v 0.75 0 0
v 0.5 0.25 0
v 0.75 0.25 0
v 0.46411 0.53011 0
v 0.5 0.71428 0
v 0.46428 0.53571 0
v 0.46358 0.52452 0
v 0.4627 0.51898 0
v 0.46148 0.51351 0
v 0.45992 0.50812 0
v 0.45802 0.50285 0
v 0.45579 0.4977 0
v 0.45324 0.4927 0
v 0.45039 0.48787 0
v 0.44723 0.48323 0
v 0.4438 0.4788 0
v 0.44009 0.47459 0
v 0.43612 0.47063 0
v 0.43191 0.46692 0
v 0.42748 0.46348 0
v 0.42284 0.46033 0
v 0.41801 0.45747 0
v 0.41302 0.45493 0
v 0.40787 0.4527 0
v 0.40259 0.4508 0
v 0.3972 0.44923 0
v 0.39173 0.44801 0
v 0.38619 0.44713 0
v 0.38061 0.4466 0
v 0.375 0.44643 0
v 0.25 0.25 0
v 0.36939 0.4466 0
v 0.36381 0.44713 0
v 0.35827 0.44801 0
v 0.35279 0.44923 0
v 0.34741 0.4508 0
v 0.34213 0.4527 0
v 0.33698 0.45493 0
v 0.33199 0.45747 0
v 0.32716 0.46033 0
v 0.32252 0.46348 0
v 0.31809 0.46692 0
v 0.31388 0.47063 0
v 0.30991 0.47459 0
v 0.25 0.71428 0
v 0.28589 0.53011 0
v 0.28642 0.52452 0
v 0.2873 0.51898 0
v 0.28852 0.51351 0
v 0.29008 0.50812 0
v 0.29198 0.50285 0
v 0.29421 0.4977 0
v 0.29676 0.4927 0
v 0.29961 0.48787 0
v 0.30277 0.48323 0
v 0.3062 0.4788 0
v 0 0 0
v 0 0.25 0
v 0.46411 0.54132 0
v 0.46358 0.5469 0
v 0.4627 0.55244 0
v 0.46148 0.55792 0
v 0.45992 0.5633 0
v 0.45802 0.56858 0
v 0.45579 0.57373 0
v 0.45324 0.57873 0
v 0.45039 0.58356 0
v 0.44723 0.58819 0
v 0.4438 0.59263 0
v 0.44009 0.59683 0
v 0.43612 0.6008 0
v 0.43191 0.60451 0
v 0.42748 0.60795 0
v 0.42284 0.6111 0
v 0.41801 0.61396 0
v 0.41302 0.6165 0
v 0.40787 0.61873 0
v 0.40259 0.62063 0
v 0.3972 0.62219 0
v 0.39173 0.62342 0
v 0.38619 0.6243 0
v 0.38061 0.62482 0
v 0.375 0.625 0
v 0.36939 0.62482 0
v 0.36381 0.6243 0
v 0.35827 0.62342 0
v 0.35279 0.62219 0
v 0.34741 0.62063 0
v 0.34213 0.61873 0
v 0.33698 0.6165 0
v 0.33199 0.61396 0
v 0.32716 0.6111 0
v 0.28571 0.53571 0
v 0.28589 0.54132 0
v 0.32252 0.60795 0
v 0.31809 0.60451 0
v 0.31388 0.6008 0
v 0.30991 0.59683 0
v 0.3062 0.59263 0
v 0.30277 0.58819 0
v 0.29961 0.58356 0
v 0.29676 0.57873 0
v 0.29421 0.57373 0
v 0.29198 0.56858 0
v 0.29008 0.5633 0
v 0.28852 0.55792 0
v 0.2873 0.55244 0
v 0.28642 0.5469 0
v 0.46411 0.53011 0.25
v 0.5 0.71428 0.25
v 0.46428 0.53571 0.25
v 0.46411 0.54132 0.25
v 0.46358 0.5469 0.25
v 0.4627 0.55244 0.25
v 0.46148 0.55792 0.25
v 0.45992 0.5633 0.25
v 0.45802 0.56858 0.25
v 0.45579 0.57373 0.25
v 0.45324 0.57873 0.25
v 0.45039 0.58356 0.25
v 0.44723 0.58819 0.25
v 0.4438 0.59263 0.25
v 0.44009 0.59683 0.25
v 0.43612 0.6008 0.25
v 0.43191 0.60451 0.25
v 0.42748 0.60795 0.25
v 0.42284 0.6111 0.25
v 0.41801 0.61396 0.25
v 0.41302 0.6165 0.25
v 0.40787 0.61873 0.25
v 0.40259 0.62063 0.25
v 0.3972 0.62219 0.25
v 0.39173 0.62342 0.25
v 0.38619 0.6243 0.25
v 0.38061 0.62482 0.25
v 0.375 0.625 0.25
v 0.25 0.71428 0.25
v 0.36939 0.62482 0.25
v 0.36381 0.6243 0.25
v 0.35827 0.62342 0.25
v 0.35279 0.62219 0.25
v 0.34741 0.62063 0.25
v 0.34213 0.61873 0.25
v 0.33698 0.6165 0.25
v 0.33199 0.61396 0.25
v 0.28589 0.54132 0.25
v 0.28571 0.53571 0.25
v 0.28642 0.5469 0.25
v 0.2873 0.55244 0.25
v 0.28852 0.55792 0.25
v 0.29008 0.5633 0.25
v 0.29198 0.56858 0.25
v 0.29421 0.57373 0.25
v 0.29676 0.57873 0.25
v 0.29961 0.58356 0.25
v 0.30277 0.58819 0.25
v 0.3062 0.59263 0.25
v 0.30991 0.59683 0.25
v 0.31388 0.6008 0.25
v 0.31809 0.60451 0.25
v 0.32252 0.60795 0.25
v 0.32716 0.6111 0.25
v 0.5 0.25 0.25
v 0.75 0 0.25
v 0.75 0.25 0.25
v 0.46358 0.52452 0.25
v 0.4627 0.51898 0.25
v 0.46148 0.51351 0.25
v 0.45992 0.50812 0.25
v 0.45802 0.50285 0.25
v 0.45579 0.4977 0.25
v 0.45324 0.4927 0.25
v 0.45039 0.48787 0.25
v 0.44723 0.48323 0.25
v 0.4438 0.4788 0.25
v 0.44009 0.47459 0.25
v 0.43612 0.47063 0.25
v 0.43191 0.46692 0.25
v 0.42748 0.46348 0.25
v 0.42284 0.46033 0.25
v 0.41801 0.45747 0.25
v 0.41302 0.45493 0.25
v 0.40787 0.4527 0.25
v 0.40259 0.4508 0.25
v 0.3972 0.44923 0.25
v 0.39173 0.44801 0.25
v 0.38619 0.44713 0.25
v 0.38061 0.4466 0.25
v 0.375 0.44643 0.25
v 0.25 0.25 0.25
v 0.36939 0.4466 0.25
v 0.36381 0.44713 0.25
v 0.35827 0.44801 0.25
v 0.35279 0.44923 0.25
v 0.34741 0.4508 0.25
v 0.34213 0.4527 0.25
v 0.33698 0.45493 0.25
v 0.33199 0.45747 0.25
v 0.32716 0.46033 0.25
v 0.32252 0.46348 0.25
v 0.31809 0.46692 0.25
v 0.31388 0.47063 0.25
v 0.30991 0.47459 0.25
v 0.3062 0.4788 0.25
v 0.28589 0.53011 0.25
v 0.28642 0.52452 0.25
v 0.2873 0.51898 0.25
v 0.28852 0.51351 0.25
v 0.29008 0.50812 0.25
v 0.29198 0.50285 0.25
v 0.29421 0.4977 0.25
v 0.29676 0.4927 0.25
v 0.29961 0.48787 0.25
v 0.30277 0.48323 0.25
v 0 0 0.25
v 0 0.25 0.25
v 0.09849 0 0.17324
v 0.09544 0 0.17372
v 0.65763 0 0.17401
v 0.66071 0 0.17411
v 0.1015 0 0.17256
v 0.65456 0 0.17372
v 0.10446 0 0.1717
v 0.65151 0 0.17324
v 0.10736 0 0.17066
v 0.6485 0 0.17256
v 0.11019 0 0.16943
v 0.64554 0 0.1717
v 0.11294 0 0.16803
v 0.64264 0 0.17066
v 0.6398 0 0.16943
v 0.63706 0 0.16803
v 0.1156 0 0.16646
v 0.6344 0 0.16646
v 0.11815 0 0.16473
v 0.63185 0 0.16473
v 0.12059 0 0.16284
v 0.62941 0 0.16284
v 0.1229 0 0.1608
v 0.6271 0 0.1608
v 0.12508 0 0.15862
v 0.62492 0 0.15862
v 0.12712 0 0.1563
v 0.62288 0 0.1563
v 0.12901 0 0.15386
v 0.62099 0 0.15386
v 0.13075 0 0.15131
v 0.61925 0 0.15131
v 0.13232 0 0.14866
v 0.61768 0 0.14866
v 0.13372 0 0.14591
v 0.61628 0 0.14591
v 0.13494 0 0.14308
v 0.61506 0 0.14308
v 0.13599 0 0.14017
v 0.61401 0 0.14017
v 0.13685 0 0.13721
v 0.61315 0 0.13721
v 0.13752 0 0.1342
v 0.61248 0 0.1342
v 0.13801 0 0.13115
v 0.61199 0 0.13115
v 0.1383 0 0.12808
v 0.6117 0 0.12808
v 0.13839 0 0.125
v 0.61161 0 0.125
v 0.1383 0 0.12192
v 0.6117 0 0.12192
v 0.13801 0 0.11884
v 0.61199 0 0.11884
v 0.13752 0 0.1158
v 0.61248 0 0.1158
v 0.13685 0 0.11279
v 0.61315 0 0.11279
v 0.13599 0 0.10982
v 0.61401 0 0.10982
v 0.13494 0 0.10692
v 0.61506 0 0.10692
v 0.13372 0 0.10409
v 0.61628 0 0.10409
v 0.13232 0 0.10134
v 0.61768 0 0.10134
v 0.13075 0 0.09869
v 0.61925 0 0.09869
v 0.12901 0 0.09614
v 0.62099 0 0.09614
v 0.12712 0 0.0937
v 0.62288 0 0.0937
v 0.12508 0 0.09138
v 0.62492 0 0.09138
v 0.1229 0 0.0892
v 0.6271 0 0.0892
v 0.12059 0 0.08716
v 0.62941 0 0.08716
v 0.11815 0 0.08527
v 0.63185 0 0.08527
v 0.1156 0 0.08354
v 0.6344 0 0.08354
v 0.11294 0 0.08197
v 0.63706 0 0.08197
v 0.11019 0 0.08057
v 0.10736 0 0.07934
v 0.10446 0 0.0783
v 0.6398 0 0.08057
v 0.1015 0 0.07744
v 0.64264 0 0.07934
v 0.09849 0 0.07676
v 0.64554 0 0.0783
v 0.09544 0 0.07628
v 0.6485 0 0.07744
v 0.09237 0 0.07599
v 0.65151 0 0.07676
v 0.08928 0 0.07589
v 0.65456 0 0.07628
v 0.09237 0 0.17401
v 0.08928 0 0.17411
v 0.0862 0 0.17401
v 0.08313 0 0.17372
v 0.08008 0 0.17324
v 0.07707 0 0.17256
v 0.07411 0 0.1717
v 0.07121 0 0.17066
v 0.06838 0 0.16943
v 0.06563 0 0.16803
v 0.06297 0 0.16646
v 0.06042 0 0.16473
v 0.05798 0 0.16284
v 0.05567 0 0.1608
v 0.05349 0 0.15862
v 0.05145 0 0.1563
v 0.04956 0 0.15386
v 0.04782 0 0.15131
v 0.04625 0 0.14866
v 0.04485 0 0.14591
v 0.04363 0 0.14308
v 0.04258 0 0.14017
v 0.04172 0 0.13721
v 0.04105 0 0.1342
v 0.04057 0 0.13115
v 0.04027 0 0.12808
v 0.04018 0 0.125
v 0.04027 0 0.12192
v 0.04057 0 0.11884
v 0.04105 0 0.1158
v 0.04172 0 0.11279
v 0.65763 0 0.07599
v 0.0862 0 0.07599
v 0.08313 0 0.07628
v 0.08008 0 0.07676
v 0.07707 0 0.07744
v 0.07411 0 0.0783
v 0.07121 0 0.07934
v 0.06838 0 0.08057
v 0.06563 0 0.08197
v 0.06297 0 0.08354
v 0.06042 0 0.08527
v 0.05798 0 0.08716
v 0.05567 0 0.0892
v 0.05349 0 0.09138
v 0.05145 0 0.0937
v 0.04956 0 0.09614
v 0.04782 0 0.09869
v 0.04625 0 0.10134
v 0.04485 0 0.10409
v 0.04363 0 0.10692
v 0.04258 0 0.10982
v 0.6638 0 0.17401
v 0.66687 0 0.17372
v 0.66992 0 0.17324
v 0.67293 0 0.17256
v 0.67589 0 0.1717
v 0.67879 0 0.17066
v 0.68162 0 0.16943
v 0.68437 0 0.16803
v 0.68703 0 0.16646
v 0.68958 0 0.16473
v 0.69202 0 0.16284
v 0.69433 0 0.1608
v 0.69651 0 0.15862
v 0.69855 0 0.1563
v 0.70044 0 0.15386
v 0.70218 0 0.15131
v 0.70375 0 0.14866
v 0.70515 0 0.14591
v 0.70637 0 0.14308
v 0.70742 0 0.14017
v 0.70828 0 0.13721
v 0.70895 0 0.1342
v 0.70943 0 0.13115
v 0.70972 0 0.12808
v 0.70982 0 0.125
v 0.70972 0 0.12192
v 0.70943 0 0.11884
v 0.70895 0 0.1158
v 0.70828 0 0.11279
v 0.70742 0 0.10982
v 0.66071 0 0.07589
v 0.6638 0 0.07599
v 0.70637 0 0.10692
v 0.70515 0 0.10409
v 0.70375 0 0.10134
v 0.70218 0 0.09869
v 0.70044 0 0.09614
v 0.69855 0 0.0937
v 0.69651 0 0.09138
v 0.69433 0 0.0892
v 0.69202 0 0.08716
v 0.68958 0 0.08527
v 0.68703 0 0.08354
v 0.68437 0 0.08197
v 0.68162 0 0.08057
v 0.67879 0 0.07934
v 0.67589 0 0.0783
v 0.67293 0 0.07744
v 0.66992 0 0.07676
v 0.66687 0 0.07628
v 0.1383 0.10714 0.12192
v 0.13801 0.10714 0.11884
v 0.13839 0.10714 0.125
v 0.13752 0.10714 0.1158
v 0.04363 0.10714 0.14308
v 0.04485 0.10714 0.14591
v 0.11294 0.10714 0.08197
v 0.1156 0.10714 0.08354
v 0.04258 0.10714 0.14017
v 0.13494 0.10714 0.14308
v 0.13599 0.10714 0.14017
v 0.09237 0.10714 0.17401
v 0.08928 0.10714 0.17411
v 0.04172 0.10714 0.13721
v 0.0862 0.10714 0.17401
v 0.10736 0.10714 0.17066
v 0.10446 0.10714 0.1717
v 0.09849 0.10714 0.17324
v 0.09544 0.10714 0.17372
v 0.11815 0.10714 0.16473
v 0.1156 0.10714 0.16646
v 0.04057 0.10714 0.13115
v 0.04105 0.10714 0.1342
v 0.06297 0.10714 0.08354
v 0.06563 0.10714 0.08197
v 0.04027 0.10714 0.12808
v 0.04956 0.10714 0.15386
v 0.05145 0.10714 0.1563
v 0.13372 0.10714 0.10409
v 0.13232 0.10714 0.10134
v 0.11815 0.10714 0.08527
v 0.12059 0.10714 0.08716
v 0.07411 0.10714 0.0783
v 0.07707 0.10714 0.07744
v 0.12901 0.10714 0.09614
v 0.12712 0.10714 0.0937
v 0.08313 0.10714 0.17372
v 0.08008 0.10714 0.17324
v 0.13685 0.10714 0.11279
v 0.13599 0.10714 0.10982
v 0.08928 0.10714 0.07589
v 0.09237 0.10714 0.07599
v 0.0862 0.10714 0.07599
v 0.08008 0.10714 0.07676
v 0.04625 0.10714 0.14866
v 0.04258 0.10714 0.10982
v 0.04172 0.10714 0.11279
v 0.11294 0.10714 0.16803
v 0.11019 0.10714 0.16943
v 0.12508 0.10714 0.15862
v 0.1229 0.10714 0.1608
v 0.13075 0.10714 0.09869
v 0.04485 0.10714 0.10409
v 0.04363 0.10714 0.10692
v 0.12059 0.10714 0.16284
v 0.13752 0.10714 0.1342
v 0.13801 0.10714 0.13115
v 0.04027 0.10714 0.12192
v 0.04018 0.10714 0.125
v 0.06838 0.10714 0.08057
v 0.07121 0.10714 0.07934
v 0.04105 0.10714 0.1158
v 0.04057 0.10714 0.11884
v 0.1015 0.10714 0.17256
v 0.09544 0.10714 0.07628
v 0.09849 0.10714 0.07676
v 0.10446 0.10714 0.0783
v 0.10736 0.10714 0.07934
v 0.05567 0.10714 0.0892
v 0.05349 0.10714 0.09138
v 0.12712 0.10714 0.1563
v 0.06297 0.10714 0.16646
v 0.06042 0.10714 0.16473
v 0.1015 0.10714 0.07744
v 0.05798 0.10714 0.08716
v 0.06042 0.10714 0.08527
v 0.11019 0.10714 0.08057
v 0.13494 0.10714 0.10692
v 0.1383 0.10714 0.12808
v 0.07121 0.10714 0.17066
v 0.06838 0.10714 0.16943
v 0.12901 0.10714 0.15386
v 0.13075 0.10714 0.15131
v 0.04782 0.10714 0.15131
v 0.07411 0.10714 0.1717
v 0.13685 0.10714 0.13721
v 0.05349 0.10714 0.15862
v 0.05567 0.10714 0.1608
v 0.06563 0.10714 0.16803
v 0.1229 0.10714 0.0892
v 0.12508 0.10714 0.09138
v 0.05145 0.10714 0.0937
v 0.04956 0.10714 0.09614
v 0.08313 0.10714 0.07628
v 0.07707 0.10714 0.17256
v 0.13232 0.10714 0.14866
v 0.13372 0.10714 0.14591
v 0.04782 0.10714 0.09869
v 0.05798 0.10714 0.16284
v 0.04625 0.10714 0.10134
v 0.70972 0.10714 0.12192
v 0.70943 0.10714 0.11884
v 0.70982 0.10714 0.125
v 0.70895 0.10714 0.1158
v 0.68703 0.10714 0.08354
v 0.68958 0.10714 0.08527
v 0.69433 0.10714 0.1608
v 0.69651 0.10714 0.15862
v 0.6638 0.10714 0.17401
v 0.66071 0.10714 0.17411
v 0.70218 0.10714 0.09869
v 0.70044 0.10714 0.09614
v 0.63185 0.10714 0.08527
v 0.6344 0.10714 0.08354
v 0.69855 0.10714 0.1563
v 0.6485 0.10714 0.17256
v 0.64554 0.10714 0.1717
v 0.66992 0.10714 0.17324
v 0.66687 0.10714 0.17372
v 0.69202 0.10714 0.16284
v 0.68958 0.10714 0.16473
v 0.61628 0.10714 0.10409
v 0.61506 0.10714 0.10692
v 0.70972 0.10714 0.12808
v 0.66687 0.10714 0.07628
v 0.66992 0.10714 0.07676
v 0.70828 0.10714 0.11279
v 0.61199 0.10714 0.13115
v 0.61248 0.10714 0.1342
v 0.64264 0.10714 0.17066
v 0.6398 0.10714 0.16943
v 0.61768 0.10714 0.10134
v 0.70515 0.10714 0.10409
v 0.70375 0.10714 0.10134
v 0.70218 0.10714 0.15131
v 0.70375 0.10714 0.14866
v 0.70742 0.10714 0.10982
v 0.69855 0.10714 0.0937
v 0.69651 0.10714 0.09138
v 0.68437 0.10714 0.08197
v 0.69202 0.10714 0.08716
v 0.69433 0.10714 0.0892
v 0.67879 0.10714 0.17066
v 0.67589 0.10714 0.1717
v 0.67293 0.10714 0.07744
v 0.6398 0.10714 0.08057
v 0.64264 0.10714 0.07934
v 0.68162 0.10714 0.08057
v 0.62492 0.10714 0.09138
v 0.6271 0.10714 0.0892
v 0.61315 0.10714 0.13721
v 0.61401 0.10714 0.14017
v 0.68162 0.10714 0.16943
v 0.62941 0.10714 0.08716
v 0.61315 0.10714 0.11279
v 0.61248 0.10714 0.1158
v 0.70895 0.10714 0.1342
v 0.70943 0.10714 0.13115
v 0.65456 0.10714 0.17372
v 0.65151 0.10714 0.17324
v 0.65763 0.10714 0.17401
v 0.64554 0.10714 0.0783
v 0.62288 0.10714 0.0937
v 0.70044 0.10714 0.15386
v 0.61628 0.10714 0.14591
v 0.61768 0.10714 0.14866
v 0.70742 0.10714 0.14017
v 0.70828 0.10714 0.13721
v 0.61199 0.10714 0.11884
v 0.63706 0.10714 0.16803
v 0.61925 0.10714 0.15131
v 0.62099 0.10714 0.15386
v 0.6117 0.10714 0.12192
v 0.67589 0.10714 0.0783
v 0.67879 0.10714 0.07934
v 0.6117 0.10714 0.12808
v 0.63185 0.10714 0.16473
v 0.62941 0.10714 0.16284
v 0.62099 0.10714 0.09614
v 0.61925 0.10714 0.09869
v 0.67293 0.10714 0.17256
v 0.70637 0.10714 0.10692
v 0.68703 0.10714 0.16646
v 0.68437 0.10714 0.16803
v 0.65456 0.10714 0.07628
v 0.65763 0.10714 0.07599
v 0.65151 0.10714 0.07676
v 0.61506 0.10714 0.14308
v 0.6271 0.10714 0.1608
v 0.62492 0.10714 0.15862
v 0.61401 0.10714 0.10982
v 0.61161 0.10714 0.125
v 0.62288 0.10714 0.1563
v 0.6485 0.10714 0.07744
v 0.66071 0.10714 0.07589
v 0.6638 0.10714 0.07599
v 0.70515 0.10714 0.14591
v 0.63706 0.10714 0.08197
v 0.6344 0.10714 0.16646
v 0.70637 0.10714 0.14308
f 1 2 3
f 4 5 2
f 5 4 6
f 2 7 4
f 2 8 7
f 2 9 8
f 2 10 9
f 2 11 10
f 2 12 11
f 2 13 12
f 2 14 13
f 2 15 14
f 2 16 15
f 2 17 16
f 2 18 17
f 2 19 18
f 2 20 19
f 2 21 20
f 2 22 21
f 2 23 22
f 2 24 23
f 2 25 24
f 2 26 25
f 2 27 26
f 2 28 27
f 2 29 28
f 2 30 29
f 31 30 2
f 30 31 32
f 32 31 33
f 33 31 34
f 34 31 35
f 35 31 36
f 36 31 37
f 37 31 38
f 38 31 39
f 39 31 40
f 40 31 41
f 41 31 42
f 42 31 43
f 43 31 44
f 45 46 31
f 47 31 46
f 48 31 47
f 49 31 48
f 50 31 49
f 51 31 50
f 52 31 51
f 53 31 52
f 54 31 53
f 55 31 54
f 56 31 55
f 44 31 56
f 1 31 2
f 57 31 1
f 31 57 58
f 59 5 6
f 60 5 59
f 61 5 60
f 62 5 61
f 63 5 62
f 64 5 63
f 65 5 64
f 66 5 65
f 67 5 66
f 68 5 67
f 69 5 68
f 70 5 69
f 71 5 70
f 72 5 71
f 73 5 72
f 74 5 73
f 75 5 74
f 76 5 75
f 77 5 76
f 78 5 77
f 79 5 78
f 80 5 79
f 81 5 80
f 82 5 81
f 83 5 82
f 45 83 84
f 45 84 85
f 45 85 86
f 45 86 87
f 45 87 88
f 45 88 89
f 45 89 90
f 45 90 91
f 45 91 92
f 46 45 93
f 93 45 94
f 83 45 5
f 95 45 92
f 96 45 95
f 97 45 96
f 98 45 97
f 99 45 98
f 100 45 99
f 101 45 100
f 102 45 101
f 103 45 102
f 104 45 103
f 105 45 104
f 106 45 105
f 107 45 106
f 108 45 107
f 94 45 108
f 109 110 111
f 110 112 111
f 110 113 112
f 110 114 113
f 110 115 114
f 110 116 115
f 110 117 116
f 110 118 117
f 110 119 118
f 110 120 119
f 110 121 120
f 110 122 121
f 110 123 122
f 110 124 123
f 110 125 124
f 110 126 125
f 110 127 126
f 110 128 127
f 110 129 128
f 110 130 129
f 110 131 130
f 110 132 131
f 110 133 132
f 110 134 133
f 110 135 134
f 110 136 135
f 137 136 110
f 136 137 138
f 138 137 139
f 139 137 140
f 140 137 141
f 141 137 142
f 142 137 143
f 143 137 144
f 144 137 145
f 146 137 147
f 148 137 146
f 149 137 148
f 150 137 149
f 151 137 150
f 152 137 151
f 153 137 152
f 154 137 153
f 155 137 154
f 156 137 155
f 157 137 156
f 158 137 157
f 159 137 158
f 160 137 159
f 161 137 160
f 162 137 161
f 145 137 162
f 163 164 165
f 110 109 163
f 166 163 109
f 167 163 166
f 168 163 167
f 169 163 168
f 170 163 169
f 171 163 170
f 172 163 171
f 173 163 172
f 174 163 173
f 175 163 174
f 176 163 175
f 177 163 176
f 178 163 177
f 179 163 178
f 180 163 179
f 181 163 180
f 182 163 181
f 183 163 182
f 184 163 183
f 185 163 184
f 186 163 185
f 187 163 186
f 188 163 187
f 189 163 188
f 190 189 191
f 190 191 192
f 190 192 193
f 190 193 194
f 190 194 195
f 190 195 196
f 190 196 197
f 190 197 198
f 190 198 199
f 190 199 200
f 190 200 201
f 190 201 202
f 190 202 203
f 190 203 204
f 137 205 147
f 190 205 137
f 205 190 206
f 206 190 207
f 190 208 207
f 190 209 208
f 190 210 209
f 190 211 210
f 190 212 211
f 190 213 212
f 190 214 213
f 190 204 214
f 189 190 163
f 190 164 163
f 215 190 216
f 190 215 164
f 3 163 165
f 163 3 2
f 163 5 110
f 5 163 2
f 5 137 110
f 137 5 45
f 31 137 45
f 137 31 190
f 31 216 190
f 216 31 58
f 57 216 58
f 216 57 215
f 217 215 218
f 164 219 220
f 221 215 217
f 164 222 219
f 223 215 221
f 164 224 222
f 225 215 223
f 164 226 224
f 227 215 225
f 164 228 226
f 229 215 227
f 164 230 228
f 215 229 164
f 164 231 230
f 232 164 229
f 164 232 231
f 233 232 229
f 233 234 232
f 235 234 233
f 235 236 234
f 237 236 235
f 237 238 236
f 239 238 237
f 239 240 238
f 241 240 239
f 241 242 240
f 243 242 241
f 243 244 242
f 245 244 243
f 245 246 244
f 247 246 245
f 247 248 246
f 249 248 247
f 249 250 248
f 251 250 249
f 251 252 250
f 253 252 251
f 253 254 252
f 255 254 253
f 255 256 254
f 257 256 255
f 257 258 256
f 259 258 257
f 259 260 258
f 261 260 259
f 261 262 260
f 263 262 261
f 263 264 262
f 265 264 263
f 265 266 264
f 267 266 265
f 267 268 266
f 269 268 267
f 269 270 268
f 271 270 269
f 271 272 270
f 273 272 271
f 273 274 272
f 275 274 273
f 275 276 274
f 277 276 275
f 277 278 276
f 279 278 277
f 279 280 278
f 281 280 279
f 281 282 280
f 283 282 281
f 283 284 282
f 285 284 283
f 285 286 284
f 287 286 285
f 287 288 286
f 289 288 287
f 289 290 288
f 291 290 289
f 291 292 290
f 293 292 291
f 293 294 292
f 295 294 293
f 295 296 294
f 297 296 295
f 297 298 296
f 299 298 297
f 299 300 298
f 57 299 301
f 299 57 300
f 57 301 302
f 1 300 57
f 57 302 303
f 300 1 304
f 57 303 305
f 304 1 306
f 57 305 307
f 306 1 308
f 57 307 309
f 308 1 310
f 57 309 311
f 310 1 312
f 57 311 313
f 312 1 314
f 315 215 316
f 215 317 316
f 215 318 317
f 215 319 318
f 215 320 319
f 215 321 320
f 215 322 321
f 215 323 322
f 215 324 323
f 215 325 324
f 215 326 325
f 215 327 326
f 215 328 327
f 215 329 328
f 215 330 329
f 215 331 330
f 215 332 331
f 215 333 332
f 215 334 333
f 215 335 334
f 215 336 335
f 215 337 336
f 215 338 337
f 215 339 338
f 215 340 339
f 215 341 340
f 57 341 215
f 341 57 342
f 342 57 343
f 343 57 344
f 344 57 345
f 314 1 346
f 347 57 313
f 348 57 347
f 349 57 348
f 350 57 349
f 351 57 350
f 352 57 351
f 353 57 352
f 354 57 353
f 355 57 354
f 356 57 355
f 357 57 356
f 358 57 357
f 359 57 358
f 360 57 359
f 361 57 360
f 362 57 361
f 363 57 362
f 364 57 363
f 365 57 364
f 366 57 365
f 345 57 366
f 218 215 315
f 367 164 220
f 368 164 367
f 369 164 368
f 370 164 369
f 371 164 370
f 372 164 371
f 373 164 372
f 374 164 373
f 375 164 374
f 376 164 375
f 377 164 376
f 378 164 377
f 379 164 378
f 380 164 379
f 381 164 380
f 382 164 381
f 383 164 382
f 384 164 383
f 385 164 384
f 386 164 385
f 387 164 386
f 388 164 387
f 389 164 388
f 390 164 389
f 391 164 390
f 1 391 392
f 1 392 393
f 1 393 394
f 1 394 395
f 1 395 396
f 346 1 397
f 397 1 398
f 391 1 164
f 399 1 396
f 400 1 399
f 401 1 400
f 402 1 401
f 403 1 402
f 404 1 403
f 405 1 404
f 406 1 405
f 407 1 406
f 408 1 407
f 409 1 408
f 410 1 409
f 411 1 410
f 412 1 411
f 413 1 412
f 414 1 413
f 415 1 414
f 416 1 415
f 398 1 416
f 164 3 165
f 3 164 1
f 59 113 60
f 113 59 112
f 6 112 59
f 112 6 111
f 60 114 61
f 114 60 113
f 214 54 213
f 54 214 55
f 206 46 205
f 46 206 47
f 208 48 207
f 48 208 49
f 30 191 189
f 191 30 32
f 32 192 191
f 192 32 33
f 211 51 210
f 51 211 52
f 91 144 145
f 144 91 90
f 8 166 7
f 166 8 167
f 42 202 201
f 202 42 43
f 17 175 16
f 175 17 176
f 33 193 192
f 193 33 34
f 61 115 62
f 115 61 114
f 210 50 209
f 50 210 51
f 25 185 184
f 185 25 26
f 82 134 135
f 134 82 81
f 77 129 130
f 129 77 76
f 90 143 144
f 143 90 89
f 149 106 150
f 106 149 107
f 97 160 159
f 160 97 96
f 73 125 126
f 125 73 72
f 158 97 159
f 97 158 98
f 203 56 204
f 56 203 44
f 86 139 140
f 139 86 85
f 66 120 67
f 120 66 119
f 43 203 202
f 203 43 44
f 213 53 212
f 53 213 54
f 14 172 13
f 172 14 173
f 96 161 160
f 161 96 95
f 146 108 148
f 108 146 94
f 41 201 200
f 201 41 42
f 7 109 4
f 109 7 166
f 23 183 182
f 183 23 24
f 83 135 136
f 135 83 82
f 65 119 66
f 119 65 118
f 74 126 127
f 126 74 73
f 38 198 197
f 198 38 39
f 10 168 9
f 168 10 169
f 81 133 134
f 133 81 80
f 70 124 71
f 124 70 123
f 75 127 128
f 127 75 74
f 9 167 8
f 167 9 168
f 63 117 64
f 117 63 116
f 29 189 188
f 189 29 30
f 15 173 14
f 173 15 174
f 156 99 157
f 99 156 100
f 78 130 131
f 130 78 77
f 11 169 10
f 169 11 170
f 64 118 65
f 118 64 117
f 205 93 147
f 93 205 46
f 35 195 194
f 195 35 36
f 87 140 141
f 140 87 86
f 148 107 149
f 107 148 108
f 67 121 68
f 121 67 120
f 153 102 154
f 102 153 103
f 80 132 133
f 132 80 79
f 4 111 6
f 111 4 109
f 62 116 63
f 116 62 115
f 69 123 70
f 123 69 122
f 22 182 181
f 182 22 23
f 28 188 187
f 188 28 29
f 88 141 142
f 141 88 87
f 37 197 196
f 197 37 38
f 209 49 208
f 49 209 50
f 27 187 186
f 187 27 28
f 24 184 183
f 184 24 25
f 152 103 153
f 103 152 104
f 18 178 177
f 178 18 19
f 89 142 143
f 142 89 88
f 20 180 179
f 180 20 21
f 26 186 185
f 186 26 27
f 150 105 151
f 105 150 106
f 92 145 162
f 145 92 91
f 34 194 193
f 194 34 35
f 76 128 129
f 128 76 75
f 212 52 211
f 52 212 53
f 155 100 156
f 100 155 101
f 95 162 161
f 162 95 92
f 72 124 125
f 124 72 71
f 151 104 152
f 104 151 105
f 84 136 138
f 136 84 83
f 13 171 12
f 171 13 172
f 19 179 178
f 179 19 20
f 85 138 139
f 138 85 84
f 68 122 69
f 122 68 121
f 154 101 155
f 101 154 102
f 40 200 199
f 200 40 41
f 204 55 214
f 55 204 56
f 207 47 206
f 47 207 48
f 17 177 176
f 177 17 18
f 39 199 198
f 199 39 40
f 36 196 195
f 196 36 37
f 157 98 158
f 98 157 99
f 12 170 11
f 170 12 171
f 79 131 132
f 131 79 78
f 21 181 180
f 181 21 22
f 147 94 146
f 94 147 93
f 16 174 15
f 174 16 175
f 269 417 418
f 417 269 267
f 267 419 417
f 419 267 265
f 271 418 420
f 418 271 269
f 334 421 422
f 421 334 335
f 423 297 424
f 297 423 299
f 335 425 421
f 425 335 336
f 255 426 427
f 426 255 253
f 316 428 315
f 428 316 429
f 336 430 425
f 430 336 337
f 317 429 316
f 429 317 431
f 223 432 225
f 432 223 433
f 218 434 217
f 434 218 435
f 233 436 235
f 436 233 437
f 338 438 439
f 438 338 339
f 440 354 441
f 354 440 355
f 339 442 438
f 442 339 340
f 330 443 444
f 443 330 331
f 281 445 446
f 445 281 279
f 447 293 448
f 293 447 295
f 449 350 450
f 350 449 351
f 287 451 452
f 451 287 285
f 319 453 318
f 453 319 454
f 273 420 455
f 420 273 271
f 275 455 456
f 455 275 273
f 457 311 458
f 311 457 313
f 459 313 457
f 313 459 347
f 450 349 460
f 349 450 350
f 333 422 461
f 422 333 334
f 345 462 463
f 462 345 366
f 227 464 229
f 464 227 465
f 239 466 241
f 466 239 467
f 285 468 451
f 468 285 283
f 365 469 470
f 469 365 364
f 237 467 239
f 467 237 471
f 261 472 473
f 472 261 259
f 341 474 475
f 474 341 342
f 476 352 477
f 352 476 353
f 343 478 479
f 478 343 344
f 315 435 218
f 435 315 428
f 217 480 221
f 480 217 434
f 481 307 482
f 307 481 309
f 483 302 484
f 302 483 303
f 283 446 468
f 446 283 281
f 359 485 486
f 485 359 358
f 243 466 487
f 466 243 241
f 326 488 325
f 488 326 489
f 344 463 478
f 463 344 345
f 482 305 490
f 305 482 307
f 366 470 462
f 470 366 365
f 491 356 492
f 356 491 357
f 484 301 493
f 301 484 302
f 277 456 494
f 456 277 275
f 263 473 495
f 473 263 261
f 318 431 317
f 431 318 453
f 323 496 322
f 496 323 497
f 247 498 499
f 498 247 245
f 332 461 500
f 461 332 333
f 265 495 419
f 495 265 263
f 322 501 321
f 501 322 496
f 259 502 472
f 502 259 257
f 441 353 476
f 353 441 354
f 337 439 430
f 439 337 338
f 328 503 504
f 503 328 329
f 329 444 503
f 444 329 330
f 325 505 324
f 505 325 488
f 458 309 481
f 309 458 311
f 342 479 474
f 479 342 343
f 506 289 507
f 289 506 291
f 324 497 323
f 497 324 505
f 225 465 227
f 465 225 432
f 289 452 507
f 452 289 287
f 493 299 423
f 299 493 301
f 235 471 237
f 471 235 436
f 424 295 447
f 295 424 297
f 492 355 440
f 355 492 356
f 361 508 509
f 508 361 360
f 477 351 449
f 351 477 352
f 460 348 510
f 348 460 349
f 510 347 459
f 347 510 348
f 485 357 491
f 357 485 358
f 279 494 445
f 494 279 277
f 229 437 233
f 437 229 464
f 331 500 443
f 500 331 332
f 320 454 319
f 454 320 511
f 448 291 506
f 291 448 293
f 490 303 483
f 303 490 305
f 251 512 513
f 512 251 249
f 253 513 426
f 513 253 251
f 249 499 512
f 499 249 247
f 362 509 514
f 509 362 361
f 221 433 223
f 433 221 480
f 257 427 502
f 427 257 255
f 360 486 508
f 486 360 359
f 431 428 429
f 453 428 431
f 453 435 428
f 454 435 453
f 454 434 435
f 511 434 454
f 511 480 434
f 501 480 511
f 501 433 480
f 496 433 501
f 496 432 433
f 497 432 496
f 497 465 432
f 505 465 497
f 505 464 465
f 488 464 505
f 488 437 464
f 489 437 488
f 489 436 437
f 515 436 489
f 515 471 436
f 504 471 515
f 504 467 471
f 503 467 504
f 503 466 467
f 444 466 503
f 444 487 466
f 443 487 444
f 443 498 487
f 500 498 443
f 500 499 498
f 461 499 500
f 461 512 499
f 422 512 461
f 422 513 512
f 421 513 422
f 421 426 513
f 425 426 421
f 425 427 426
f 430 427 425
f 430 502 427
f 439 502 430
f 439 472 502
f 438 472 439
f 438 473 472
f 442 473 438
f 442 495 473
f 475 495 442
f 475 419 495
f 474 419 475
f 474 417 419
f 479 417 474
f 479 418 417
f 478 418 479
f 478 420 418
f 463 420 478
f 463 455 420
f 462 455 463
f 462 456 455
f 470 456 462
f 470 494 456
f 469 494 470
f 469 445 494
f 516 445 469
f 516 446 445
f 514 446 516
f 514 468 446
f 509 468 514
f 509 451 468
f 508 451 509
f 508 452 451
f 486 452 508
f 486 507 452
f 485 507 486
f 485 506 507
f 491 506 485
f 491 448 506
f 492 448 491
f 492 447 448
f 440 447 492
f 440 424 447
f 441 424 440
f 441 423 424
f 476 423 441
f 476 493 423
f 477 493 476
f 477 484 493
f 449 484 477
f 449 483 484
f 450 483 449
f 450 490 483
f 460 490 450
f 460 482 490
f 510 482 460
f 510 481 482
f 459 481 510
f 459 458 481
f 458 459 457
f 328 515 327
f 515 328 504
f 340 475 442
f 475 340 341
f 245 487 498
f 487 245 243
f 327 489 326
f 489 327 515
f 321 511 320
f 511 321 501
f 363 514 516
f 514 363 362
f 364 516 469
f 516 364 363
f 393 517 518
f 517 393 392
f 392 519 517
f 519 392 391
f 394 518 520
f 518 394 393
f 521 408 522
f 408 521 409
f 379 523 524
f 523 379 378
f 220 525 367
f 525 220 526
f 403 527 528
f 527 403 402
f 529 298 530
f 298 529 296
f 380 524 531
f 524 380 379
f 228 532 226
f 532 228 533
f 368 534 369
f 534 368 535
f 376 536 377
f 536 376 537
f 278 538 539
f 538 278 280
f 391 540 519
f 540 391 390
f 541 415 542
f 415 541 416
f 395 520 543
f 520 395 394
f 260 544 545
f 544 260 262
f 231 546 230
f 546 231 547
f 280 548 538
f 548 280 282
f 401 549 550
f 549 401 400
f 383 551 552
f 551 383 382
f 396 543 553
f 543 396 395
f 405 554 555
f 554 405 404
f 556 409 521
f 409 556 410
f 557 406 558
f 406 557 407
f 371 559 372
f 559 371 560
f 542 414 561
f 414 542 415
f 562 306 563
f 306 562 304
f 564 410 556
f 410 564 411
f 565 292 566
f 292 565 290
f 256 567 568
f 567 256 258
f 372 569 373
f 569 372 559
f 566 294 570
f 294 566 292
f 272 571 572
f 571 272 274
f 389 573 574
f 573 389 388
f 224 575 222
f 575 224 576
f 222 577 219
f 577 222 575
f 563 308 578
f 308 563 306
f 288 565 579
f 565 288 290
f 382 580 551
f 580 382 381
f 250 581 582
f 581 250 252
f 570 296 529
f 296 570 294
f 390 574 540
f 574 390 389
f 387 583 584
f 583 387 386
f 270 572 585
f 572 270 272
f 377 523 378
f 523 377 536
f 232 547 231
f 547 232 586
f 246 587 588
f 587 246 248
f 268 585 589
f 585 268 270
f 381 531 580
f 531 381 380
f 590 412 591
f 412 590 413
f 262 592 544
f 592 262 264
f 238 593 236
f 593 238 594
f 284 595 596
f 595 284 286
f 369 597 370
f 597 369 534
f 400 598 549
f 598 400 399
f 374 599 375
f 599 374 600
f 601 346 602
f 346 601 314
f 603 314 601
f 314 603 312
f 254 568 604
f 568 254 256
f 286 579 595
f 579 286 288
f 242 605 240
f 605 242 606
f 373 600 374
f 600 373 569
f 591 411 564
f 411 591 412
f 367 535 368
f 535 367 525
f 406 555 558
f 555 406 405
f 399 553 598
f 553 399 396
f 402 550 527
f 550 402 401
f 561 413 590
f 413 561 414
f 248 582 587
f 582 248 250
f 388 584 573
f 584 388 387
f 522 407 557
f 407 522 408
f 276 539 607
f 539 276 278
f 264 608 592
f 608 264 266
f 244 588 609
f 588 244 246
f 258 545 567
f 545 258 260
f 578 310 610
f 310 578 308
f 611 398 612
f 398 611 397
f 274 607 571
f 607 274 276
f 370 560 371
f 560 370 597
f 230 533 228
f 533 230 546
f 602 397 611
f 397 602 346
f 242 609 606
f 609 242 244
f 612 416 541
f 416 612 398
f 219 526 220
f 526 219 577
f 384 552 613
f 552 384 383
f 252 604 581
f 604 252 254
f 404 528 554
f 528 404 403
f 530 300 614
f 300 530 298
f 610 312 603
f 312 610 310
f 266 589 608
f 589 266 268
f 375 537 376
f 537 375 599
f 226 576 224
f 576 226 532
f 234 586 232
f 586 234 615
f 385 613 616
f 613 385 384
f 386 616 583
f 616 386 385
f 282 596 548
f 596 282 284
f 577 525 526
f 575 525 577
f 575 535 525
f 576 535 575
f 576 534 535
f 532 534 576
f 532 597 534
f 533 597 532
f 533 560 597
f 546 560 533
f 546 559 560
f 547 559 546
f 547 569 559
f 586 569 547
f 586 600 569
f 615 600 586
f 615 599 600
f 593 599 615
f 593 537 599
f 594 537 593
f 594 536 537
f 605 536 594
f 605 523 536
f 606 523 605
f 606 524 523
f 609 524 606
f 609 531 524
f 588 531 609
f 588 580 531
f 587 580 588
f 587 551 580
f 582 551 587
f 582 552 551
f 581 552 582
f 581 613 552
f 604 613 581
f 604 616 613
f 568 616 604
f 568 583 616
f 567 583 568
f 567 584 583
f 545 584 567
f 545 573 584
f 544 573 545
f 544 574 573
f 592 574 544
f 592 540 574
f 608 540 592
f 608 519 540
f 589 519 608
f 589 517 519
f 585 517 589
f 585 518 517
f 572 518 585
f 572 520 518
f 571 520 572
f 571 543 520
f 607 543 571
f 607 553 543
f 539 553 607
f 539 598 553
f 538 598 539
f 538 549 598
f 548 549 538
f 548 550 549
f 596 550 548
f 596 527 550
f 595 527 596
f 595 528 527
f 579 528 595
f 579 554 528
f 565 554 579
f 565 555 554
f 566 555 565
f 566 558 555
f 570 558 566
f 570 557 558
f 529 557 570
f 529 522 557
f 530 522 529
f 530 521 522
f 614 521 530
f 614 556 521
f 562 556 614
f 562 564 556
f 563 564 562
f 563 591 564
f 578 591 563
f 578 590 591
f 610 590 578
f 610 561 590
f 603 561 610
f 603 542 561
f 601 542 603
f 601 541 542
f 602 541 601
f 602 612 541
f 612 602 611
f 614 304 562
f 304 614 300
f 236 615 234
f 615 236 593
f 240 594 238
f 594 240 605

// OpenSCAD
// Parametric dimensions
length = 0.75;                  // Overall length (X)
width = 5/7;                    // Overall width (Y) = 0.714286
height = 0.25;                  // Overall height (Z)
main_depth = 0.25;              // Depth of side portions from front face

// Stepped footprint geometry
side_width = length / 3;        // Width of each shallow side region = 0.25
center_start = side_width;      // X start of deep center region = 0.25
center_end = 2 * side_width;    // X end of deep center region = 0.5

// Upper through-opening
hole_x = length / 2;            // Axis 0.375 from left edge
hole_y = 15/28;                 // Axis 0.5357 from front edge
hole_r = 5/56;                  // Radius 0.0893

// Front blind cylindrical cuts
fh1_x = 5/56;                   // Axis 0.0893 from left edge
fh2_x = 37/56;                  // Axis 0.6607 from left edge
fh_z = height / 2;              // Center height 0.125
fh_r = 11/224;                  // Radius 0.0491
fh_depth = 3/28;                // Blind cut depth 0.1071

$fn = 100;

// Main solid: stepped footprint extruded vertically
// Side portions extend to main_depth; center rib extends to full width
module stepped_block() {
    linear_extrude(height = height, convexity = 4)
        polygon([
            [0, 0],
            [length, 0],
            [length, main_depth],
            [center_end, main_depth],
            [center_end, width],
            [center_start, width],
            [center_start, main_depth],
            [0, main_depth]
        ]);
}

// Upper through-hole (vertical, cuts through full height)
module upper_through_hole() {
    translate([hole_x, hole_y, -0.001])
        cylinder(h = height + 0.002, r = hole_r);
}

// Front blind hole (horizontal, into +Y from front face)
module front_blind_hole(x_pos) {
    translate([x_pos, -0.001, fh_z])
        rotate([-90, 0, 0])
            cylinder(h = fh_depth + 0.001, r = fh_r);
}

// Final part with all features subtracted
difference() {
    stepped_block();
    upper_through_hole();
    front_blind_hole(fh1_x);
    front_blind_hole(fh2_x);
}
